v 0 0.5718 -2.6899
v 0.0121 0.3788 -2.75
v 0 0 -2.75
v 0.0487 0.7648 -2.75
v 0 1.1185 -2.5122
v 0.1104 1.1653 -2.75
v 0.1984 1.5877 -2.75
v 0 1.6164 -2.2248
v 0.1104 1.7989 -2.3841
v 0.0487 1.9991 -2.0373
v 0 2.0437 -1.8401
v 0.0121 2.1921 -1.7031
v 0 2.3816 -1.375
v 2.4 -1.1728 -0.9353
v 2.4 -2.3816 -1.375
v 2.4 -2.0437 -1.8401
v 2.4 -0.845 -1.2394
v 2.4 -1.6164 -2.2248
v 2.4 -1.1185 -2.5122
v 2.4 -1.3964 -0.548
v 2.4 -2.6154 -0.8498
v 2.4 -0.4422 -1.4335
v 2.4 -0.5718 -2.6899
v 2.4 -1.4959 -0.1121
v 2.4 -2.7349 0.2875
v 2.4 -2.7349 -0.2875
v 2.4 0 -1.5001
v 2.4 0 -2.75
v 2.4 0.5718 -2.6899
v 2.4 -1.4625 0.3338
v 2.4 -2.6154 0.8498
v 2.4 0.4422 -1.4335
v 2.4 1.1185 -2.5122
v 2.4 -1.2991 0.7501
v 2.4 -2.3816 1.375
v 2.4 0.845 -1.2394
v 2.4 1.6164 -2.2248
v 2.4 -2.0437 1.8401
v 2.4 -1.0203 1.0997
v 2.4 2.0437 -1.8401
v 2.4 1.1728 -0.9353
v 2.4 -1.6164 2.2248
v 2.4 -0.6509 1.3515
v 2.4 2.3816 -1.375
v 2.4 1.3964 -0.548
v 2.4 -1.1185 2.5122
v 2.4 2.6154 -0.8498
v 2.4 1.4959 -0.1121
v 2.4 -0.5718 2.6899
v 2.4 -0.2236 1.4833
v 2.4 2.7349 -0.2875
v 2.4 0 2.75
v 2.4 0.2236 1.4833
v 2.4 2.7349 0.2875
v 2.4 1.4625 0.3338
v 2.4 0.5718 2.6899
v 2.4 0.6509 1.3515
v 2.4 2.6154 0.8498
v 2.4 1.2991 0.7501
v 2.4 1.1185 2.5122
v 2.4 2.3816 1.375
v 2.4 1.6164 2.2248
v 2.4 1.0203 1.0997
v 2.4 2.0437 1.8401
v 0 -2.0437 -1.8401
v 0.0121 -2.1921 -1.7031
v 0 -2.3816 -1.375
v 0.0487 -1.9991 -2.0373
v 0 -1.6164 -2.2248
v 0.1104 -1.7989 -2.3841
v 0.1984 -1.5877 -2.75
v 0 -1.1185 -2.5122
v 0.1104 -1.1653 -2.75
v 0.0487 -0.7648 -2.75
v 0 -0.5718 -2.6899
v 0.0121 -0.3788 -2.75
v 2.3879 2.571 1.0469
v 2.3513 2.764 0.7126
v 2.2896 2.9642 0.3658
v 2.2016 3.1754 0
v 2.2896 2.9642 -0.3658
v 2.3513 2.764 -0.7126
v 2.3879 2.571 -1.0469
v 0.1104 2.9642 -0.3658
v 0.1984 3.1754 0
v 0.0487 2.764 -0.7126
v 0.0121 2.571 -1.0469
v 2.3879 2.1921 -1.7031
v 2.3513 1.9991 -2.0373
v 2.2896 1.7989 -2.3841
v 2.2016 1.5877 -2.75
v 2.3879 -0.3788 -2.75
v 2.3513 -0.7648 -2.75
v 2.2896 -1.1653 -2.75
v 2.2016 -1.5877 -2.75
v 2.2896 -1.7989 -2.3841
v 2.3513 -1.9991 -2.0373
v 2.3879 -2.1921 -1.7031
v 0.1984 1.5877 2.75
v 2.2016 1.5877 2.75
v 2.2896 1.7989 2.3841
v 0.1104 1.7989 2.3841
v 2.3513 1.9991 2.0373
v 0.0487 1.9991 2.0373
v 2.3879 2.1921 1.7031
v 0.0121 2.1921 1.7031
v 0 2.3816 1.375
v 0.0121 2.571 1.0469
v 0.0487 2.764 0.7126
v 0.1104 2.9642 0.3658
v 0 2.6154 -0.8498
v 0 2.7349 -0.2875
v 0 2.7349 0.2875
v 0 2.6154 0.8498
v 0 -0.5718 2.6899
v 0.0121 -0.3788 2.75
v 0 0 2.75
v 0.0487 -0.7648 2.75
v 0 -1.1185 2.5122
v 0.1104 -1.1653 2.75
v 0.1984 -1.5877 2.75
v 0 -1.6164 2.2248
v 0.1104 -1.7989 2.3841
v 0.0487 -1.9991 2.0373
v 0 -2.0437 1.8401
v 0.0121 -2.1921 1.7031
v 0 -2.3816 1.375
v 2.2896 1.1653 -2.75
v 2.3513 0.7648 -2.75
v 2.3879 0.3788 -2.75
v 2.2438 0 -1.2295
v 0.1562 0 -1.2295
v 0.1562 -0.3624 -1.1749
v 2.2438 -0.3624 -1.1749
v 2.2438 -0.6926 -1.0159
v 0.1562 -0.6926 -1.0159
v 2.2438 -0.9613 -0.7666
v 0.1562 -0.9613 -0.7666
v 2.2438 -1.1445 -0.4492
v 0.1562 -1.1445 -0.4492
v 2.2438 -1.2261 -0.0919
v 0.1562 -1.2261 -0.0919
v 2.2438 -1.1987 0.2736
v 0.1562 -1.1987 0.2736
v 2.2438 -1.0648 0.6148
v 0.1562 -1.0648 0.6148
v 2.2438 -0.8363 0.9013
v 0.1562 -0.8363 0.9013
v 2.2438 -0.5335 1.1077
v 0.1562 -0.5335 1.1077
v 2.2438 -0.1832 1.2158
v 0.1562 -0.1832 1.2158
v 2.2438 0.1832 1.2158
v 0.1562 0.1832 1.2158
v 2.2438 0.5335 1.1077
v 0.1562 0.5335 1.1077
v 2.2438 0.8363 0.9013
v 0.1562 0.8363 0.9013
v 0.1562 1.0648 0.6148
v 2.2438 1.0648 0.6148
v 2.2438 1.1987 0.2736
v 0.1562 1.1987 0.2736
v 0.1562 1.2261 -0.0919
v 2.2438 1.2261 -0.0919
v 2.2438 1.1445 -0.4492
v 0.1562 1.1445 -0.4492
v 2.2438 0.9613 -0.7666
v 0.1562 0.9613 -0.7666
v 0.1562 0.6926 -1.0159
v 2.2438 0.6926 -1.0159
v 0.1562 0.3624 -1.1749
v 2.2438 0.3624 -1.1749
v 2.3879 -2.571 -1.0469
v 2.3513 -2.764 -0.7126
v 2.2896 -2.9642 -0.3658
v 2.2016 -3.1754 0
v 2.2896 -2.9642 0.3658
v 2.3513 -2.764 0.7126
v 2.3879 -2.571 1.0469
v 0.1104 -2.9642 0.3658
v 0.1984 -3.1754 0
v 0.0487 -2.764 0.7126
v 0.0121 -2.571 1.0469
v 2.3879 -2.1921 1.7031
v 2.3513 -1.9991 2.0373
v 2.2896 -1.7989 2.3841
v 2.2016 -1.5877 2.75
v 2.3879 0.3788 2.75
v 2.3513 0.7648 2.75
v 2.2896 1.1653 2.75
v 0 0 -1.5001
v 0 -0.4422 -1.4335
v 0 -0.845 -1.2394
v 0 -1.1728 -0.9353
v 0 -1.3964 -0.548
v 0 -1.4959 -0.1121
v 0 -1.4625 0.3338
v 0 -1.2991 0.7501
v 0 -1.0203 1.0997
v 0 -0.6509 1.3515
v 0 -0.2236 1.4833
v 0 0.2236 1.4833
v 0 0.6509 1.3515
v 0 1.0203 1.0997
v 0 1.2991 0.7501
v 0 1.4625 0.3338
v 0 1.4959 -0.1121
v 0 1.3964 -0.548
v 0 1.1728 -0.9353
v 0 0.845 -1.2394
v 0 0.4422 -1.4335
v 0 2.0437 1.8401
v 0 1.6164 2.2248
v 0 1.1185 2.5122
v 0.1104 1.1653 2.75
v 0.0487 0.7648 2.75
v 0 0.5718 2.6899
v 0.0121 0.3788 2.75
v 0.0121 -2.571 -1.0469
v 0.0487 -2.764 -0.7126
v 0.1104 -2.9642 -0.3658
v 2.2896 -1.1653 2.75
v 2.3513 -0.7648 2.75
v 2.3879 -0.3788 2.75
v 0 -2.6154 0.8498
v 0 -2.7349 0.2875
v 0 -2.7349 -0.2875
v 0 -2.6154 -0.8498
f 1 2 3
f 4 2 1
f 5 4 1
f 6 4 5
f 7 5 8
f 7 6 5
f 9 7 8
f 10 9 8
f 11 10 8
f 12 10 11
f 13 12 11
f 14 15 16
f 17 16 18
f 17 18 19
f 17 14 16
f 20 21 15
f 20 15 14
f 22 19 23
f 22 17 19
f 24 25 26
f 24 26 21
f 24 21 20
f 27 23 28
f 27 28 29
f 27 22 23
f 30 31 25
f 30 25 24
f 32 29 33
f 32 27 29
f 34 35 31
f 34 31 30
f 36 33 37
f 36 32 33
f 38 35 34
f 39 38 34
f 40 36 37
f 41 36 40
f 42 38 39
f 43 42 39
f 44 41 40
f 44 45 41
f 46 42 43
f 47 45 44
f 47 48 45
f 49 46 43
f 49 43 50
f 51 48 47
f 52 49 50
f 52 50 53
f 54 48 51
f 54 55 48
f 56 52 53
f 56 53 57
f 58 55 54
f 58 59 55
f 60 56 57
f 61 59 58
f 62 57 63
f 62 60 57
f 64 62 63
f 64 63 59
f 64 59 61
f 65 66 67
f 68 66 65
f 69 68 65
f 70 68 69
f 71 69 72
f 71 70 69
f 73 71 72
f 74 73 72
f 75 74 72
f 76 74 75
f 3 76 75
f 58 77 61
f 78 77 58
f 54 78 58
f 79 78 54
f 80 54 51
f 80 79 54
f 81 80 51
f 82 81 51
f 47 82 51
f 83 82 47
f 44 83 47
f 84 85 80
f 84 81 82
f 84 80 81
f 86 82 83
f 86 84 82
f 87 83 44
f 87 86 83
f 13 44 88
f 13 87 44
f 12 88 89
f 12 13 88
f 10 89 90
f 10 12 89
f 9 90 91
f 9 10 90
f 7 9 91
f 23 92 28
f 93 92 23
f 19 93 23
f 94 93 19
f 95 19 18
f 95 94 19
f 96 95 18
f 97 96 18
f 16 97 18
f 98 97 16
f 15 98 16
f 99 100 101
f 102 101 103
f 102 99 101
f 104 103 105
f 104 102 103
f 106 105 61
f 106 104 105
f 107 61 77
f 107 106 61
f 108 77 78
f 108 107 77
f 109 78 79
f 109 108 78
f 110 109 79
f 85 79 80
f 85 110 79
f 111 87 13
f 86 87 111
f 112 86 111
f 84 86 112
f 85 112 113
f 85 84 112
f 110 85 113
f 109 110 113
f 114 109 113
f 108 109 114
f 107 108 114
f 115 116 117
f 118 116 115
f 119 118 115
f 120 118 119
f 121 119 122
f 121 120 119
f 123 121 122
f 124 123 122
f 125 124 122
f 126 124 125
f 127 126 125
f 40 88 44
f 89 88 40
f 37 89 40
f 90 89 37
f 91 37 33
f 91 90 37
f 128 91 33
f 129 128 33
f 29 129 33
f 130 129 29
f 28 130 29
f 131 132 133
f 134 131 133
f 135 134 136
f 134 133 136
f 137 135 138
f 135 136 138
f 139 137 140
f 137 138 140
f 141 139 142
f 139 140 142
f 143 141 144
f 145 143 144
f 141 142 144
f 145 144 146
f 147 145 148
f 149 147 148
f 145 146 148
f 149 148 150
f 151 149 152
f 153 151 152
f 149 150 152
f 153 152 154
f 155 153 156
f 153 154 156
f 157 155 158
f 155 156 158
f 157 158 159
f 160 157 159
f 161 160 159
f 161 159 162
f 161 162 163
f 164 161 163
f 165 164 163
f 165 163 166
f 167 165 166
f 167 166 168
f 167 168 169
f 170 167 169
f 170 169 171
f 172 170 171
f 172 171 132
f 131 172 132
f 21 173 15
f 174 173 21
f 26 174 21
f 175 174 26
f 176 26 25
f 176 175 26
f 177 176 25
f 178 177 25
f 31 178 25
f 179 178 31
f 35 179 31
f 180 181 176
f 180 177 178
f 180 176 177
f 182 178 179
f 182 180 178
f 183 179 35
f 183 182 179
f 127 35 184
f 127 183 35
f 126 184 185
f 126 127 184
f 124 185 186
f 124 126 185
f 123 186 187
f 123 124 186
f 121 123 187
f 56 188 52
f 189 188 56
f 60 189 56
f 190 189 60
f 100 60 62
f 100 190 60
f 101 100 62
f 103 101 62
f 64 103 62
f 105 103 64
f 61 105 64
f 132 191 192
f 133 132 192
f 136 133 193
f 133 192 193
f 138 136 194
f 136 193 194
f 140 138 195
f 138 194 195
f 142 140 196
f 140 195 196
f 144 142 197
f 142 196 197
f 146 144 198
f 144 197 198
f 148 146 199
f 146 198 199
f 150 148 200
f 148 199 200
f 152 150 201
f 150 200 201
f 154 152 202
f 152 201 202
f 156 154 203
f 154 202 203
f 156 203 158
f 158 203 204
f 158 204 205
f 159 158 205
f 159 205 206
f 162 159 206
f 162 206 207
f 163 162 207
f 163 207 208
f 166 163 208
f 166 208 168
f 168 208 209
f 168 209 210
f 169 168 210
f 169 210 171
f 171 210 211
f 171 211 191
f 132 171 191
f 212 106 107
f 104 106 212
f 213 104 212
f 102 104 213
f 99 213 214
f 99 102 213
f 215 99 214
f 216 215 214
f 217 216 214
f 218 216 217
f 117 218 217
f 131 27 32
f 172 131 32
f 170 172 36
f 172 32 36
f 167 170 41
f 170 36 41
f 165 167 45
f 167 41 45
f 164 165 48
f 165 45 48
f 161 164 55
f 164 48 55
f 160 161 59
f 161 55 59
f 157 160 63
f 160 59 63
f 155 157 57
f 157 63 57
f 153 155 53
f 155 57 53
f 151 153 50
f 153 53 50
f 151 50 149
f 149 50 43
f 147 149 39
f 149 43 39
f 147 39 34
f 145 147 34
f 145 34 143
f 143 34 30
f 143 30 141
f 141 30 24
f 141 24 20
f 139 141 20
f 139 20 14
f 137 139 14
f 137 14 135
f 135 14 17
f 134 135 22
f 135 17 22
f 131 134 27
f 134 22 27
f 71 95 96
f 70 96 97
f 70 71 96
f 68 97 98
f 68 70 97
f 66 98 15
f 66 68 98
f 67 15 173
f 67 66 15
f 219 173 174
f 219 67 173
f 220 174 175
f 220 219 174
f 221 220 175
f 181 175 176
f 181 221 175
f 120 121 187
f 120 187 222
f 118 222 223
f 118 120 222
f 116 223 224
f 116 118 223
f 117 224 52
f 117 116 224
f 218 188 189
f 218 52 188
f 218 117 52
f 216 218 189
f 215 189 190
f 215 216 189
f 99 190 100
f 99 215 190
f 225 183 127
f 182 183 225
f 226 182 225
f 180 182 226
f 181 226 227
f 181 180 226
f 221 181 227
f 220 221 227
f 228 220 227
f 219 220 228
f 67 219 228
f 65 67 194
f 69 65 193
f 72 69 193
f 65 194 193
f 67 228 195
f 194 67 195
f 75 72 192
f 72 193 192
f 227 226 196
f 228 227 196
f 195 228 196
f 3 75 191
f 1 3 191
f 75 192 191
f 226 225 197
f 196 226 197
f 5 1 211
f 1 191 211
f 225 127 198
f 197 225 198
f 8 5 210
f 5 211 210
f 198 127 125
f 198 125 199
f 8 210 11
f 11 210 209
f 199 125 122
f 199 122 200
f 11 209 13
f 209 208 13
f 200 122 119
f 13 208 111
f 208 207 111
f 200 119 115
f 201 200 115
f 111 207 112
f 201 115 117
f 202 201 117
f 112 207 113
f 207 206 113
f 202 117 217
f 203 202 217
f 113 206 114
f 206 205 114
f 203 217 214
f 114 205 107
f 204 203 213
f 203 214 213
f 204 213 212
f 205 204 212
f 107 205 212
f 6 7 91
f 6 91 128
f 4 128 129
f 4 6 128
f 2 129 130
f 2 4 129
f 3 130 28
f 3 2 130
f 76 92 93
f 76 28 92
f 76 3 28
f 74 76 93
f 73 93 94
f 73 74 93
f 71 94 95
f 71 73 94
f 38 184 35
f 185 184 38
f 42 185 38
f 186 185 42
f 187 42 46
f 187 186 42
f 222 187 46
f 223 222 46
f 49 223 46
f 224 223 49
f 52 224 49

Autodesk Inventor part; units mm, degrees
ref_plane "YZ Plane" through (0, 0, 0) normal (1, 0, 0) x (0, 1, 0)
ref_plane "XZ Plane" through (0, 0, 0) normal (0, 1, 0) x (-1, 0, 0)
sketch "Sketch1" plane through (0, 0, 0) normal (1, 0, 0) x (0, 1, 0)
  line L0 (-3.1754, 0) -> (-1.5877, 2.75)
  line L1 (-1.5877, 2.75) -> (1.5877, 2.75)
  line L2 (1.5877, 2.75) -> (3.1754, 0)
  line L3 (3.1754, 0) -> (1.5877, -2.75)
  line L4 (1.5877, -2.75) -> (-1.5877, -2.75)
  line L5 (-1.5877, -2.75) -> (-3.1754, 0)
  point P0 (0, 0)
  point P1 (0, 0)
  dimension "d0" = 6.3509
extrude "Body" add sketch "Sketch1" along normal blind 2.4
sketch "Sketch2" plane through (0, 0, 0) normal (0, 0, 1) x (1, 0, 0)
  line L0 (0, 1.5877) -> (0, 3.1754) projected
  line L1 (0, 3.1754) -> (2.4, 3.1754) projected
  line L2 (2.4, 1.5877) -> (2.4, 3.1754) projected
  line L3 (-0.48, 0) -> (2.88, 0) projected
  line L4 (0.1984, 3.1754) -> (0, 2.75)
  line L5 (2.2016, 3.1754) -> (2.4, 2.75)
  dimension "d3" = 25
  dimension "d4" = 25
  dimension "d5" = 5.5
  dimension "d6" = 5.5
revolve "Chamfer1" cut sketch "Sketch2" angle 360 about axis through (-10, 0, 0) along (1, 0, 0)
sketch "Sketch3" plane through (2.4, 0, 0) normal (1, 0, 0) x (0, 0, -1)
  arc A0 (-1.375, -2.3816) -> (1.375, -2.3816) centre (0, 0) ccw projected
hole "Thread" at (2.4, 0, 0) direction (-1, 0, 0) diameter 2.459 end through all thread size "M3x0.5" class "6H" standard "ANSI Metric M Profile"
chamfer "Chamfer2" distance 0.2706 angle 30 1 edges at (2.4, 0, 1.2295) measured on face at (2.4, -2.2301, -0.0494)
chamfer "Chamfer3" distance 0.2706 angle 30 1 edges at (0, 0, 1.2295) measured on face at (0, -2.2301, -0.0494)
ref_plane "Work Plane1" through (-6.3375, 0, 0) normal (0, -0.8660254, -0.5) x (1, 0, 0)
equation "\"d0\" = 1.1547 * SW"
equation "\"d1\" = KOH"
equation "\"d3\" = ANG1"
equation "\"d4\" = ANG2"
equation "\"d5\" = SW0"
equation "\"d6\" = SW01"
equation "\"d8\" = -0.5 * GD1 + 0.5 * NND"
equation "\"d40\" = -0.5 * GD1 + 0.5 * NND"
equation "\"d10\" = -0.5 * GD1 + 0.5 * NND"
equation "\"d41\" = -0.5 * GD1 + 0.5 * NND"
equation "\"ANG1\" = 25deg"
equation "\"ANG2\" = 25deg"
equation "\"NND\" = 3"
equation "\"KOH\" = 2.4"
equation "\"SW\" = 5.5"
equation "\"SW0\" = SW"
equation "\"SW01\" = SW"
equation "\"GUL\" = 0.541266 * PTC"
equation "\"THREADDIA\" = 3"
equation "\"TOA\" = 30deg"
equation "\"PTC\" = 0.5"
equation "\"E0\" = 1.155 * SW"
equation "\"GAL\" = 0.541266 * PTC"
equation "\"SD2\" = 0"
equation "\"WFT\" = 0"
equation "\"GD1\" = 2.458734"
properties part number "ANSI B 18.2.4.1 M - M3 x 0.5" material "Steel, Mild"
